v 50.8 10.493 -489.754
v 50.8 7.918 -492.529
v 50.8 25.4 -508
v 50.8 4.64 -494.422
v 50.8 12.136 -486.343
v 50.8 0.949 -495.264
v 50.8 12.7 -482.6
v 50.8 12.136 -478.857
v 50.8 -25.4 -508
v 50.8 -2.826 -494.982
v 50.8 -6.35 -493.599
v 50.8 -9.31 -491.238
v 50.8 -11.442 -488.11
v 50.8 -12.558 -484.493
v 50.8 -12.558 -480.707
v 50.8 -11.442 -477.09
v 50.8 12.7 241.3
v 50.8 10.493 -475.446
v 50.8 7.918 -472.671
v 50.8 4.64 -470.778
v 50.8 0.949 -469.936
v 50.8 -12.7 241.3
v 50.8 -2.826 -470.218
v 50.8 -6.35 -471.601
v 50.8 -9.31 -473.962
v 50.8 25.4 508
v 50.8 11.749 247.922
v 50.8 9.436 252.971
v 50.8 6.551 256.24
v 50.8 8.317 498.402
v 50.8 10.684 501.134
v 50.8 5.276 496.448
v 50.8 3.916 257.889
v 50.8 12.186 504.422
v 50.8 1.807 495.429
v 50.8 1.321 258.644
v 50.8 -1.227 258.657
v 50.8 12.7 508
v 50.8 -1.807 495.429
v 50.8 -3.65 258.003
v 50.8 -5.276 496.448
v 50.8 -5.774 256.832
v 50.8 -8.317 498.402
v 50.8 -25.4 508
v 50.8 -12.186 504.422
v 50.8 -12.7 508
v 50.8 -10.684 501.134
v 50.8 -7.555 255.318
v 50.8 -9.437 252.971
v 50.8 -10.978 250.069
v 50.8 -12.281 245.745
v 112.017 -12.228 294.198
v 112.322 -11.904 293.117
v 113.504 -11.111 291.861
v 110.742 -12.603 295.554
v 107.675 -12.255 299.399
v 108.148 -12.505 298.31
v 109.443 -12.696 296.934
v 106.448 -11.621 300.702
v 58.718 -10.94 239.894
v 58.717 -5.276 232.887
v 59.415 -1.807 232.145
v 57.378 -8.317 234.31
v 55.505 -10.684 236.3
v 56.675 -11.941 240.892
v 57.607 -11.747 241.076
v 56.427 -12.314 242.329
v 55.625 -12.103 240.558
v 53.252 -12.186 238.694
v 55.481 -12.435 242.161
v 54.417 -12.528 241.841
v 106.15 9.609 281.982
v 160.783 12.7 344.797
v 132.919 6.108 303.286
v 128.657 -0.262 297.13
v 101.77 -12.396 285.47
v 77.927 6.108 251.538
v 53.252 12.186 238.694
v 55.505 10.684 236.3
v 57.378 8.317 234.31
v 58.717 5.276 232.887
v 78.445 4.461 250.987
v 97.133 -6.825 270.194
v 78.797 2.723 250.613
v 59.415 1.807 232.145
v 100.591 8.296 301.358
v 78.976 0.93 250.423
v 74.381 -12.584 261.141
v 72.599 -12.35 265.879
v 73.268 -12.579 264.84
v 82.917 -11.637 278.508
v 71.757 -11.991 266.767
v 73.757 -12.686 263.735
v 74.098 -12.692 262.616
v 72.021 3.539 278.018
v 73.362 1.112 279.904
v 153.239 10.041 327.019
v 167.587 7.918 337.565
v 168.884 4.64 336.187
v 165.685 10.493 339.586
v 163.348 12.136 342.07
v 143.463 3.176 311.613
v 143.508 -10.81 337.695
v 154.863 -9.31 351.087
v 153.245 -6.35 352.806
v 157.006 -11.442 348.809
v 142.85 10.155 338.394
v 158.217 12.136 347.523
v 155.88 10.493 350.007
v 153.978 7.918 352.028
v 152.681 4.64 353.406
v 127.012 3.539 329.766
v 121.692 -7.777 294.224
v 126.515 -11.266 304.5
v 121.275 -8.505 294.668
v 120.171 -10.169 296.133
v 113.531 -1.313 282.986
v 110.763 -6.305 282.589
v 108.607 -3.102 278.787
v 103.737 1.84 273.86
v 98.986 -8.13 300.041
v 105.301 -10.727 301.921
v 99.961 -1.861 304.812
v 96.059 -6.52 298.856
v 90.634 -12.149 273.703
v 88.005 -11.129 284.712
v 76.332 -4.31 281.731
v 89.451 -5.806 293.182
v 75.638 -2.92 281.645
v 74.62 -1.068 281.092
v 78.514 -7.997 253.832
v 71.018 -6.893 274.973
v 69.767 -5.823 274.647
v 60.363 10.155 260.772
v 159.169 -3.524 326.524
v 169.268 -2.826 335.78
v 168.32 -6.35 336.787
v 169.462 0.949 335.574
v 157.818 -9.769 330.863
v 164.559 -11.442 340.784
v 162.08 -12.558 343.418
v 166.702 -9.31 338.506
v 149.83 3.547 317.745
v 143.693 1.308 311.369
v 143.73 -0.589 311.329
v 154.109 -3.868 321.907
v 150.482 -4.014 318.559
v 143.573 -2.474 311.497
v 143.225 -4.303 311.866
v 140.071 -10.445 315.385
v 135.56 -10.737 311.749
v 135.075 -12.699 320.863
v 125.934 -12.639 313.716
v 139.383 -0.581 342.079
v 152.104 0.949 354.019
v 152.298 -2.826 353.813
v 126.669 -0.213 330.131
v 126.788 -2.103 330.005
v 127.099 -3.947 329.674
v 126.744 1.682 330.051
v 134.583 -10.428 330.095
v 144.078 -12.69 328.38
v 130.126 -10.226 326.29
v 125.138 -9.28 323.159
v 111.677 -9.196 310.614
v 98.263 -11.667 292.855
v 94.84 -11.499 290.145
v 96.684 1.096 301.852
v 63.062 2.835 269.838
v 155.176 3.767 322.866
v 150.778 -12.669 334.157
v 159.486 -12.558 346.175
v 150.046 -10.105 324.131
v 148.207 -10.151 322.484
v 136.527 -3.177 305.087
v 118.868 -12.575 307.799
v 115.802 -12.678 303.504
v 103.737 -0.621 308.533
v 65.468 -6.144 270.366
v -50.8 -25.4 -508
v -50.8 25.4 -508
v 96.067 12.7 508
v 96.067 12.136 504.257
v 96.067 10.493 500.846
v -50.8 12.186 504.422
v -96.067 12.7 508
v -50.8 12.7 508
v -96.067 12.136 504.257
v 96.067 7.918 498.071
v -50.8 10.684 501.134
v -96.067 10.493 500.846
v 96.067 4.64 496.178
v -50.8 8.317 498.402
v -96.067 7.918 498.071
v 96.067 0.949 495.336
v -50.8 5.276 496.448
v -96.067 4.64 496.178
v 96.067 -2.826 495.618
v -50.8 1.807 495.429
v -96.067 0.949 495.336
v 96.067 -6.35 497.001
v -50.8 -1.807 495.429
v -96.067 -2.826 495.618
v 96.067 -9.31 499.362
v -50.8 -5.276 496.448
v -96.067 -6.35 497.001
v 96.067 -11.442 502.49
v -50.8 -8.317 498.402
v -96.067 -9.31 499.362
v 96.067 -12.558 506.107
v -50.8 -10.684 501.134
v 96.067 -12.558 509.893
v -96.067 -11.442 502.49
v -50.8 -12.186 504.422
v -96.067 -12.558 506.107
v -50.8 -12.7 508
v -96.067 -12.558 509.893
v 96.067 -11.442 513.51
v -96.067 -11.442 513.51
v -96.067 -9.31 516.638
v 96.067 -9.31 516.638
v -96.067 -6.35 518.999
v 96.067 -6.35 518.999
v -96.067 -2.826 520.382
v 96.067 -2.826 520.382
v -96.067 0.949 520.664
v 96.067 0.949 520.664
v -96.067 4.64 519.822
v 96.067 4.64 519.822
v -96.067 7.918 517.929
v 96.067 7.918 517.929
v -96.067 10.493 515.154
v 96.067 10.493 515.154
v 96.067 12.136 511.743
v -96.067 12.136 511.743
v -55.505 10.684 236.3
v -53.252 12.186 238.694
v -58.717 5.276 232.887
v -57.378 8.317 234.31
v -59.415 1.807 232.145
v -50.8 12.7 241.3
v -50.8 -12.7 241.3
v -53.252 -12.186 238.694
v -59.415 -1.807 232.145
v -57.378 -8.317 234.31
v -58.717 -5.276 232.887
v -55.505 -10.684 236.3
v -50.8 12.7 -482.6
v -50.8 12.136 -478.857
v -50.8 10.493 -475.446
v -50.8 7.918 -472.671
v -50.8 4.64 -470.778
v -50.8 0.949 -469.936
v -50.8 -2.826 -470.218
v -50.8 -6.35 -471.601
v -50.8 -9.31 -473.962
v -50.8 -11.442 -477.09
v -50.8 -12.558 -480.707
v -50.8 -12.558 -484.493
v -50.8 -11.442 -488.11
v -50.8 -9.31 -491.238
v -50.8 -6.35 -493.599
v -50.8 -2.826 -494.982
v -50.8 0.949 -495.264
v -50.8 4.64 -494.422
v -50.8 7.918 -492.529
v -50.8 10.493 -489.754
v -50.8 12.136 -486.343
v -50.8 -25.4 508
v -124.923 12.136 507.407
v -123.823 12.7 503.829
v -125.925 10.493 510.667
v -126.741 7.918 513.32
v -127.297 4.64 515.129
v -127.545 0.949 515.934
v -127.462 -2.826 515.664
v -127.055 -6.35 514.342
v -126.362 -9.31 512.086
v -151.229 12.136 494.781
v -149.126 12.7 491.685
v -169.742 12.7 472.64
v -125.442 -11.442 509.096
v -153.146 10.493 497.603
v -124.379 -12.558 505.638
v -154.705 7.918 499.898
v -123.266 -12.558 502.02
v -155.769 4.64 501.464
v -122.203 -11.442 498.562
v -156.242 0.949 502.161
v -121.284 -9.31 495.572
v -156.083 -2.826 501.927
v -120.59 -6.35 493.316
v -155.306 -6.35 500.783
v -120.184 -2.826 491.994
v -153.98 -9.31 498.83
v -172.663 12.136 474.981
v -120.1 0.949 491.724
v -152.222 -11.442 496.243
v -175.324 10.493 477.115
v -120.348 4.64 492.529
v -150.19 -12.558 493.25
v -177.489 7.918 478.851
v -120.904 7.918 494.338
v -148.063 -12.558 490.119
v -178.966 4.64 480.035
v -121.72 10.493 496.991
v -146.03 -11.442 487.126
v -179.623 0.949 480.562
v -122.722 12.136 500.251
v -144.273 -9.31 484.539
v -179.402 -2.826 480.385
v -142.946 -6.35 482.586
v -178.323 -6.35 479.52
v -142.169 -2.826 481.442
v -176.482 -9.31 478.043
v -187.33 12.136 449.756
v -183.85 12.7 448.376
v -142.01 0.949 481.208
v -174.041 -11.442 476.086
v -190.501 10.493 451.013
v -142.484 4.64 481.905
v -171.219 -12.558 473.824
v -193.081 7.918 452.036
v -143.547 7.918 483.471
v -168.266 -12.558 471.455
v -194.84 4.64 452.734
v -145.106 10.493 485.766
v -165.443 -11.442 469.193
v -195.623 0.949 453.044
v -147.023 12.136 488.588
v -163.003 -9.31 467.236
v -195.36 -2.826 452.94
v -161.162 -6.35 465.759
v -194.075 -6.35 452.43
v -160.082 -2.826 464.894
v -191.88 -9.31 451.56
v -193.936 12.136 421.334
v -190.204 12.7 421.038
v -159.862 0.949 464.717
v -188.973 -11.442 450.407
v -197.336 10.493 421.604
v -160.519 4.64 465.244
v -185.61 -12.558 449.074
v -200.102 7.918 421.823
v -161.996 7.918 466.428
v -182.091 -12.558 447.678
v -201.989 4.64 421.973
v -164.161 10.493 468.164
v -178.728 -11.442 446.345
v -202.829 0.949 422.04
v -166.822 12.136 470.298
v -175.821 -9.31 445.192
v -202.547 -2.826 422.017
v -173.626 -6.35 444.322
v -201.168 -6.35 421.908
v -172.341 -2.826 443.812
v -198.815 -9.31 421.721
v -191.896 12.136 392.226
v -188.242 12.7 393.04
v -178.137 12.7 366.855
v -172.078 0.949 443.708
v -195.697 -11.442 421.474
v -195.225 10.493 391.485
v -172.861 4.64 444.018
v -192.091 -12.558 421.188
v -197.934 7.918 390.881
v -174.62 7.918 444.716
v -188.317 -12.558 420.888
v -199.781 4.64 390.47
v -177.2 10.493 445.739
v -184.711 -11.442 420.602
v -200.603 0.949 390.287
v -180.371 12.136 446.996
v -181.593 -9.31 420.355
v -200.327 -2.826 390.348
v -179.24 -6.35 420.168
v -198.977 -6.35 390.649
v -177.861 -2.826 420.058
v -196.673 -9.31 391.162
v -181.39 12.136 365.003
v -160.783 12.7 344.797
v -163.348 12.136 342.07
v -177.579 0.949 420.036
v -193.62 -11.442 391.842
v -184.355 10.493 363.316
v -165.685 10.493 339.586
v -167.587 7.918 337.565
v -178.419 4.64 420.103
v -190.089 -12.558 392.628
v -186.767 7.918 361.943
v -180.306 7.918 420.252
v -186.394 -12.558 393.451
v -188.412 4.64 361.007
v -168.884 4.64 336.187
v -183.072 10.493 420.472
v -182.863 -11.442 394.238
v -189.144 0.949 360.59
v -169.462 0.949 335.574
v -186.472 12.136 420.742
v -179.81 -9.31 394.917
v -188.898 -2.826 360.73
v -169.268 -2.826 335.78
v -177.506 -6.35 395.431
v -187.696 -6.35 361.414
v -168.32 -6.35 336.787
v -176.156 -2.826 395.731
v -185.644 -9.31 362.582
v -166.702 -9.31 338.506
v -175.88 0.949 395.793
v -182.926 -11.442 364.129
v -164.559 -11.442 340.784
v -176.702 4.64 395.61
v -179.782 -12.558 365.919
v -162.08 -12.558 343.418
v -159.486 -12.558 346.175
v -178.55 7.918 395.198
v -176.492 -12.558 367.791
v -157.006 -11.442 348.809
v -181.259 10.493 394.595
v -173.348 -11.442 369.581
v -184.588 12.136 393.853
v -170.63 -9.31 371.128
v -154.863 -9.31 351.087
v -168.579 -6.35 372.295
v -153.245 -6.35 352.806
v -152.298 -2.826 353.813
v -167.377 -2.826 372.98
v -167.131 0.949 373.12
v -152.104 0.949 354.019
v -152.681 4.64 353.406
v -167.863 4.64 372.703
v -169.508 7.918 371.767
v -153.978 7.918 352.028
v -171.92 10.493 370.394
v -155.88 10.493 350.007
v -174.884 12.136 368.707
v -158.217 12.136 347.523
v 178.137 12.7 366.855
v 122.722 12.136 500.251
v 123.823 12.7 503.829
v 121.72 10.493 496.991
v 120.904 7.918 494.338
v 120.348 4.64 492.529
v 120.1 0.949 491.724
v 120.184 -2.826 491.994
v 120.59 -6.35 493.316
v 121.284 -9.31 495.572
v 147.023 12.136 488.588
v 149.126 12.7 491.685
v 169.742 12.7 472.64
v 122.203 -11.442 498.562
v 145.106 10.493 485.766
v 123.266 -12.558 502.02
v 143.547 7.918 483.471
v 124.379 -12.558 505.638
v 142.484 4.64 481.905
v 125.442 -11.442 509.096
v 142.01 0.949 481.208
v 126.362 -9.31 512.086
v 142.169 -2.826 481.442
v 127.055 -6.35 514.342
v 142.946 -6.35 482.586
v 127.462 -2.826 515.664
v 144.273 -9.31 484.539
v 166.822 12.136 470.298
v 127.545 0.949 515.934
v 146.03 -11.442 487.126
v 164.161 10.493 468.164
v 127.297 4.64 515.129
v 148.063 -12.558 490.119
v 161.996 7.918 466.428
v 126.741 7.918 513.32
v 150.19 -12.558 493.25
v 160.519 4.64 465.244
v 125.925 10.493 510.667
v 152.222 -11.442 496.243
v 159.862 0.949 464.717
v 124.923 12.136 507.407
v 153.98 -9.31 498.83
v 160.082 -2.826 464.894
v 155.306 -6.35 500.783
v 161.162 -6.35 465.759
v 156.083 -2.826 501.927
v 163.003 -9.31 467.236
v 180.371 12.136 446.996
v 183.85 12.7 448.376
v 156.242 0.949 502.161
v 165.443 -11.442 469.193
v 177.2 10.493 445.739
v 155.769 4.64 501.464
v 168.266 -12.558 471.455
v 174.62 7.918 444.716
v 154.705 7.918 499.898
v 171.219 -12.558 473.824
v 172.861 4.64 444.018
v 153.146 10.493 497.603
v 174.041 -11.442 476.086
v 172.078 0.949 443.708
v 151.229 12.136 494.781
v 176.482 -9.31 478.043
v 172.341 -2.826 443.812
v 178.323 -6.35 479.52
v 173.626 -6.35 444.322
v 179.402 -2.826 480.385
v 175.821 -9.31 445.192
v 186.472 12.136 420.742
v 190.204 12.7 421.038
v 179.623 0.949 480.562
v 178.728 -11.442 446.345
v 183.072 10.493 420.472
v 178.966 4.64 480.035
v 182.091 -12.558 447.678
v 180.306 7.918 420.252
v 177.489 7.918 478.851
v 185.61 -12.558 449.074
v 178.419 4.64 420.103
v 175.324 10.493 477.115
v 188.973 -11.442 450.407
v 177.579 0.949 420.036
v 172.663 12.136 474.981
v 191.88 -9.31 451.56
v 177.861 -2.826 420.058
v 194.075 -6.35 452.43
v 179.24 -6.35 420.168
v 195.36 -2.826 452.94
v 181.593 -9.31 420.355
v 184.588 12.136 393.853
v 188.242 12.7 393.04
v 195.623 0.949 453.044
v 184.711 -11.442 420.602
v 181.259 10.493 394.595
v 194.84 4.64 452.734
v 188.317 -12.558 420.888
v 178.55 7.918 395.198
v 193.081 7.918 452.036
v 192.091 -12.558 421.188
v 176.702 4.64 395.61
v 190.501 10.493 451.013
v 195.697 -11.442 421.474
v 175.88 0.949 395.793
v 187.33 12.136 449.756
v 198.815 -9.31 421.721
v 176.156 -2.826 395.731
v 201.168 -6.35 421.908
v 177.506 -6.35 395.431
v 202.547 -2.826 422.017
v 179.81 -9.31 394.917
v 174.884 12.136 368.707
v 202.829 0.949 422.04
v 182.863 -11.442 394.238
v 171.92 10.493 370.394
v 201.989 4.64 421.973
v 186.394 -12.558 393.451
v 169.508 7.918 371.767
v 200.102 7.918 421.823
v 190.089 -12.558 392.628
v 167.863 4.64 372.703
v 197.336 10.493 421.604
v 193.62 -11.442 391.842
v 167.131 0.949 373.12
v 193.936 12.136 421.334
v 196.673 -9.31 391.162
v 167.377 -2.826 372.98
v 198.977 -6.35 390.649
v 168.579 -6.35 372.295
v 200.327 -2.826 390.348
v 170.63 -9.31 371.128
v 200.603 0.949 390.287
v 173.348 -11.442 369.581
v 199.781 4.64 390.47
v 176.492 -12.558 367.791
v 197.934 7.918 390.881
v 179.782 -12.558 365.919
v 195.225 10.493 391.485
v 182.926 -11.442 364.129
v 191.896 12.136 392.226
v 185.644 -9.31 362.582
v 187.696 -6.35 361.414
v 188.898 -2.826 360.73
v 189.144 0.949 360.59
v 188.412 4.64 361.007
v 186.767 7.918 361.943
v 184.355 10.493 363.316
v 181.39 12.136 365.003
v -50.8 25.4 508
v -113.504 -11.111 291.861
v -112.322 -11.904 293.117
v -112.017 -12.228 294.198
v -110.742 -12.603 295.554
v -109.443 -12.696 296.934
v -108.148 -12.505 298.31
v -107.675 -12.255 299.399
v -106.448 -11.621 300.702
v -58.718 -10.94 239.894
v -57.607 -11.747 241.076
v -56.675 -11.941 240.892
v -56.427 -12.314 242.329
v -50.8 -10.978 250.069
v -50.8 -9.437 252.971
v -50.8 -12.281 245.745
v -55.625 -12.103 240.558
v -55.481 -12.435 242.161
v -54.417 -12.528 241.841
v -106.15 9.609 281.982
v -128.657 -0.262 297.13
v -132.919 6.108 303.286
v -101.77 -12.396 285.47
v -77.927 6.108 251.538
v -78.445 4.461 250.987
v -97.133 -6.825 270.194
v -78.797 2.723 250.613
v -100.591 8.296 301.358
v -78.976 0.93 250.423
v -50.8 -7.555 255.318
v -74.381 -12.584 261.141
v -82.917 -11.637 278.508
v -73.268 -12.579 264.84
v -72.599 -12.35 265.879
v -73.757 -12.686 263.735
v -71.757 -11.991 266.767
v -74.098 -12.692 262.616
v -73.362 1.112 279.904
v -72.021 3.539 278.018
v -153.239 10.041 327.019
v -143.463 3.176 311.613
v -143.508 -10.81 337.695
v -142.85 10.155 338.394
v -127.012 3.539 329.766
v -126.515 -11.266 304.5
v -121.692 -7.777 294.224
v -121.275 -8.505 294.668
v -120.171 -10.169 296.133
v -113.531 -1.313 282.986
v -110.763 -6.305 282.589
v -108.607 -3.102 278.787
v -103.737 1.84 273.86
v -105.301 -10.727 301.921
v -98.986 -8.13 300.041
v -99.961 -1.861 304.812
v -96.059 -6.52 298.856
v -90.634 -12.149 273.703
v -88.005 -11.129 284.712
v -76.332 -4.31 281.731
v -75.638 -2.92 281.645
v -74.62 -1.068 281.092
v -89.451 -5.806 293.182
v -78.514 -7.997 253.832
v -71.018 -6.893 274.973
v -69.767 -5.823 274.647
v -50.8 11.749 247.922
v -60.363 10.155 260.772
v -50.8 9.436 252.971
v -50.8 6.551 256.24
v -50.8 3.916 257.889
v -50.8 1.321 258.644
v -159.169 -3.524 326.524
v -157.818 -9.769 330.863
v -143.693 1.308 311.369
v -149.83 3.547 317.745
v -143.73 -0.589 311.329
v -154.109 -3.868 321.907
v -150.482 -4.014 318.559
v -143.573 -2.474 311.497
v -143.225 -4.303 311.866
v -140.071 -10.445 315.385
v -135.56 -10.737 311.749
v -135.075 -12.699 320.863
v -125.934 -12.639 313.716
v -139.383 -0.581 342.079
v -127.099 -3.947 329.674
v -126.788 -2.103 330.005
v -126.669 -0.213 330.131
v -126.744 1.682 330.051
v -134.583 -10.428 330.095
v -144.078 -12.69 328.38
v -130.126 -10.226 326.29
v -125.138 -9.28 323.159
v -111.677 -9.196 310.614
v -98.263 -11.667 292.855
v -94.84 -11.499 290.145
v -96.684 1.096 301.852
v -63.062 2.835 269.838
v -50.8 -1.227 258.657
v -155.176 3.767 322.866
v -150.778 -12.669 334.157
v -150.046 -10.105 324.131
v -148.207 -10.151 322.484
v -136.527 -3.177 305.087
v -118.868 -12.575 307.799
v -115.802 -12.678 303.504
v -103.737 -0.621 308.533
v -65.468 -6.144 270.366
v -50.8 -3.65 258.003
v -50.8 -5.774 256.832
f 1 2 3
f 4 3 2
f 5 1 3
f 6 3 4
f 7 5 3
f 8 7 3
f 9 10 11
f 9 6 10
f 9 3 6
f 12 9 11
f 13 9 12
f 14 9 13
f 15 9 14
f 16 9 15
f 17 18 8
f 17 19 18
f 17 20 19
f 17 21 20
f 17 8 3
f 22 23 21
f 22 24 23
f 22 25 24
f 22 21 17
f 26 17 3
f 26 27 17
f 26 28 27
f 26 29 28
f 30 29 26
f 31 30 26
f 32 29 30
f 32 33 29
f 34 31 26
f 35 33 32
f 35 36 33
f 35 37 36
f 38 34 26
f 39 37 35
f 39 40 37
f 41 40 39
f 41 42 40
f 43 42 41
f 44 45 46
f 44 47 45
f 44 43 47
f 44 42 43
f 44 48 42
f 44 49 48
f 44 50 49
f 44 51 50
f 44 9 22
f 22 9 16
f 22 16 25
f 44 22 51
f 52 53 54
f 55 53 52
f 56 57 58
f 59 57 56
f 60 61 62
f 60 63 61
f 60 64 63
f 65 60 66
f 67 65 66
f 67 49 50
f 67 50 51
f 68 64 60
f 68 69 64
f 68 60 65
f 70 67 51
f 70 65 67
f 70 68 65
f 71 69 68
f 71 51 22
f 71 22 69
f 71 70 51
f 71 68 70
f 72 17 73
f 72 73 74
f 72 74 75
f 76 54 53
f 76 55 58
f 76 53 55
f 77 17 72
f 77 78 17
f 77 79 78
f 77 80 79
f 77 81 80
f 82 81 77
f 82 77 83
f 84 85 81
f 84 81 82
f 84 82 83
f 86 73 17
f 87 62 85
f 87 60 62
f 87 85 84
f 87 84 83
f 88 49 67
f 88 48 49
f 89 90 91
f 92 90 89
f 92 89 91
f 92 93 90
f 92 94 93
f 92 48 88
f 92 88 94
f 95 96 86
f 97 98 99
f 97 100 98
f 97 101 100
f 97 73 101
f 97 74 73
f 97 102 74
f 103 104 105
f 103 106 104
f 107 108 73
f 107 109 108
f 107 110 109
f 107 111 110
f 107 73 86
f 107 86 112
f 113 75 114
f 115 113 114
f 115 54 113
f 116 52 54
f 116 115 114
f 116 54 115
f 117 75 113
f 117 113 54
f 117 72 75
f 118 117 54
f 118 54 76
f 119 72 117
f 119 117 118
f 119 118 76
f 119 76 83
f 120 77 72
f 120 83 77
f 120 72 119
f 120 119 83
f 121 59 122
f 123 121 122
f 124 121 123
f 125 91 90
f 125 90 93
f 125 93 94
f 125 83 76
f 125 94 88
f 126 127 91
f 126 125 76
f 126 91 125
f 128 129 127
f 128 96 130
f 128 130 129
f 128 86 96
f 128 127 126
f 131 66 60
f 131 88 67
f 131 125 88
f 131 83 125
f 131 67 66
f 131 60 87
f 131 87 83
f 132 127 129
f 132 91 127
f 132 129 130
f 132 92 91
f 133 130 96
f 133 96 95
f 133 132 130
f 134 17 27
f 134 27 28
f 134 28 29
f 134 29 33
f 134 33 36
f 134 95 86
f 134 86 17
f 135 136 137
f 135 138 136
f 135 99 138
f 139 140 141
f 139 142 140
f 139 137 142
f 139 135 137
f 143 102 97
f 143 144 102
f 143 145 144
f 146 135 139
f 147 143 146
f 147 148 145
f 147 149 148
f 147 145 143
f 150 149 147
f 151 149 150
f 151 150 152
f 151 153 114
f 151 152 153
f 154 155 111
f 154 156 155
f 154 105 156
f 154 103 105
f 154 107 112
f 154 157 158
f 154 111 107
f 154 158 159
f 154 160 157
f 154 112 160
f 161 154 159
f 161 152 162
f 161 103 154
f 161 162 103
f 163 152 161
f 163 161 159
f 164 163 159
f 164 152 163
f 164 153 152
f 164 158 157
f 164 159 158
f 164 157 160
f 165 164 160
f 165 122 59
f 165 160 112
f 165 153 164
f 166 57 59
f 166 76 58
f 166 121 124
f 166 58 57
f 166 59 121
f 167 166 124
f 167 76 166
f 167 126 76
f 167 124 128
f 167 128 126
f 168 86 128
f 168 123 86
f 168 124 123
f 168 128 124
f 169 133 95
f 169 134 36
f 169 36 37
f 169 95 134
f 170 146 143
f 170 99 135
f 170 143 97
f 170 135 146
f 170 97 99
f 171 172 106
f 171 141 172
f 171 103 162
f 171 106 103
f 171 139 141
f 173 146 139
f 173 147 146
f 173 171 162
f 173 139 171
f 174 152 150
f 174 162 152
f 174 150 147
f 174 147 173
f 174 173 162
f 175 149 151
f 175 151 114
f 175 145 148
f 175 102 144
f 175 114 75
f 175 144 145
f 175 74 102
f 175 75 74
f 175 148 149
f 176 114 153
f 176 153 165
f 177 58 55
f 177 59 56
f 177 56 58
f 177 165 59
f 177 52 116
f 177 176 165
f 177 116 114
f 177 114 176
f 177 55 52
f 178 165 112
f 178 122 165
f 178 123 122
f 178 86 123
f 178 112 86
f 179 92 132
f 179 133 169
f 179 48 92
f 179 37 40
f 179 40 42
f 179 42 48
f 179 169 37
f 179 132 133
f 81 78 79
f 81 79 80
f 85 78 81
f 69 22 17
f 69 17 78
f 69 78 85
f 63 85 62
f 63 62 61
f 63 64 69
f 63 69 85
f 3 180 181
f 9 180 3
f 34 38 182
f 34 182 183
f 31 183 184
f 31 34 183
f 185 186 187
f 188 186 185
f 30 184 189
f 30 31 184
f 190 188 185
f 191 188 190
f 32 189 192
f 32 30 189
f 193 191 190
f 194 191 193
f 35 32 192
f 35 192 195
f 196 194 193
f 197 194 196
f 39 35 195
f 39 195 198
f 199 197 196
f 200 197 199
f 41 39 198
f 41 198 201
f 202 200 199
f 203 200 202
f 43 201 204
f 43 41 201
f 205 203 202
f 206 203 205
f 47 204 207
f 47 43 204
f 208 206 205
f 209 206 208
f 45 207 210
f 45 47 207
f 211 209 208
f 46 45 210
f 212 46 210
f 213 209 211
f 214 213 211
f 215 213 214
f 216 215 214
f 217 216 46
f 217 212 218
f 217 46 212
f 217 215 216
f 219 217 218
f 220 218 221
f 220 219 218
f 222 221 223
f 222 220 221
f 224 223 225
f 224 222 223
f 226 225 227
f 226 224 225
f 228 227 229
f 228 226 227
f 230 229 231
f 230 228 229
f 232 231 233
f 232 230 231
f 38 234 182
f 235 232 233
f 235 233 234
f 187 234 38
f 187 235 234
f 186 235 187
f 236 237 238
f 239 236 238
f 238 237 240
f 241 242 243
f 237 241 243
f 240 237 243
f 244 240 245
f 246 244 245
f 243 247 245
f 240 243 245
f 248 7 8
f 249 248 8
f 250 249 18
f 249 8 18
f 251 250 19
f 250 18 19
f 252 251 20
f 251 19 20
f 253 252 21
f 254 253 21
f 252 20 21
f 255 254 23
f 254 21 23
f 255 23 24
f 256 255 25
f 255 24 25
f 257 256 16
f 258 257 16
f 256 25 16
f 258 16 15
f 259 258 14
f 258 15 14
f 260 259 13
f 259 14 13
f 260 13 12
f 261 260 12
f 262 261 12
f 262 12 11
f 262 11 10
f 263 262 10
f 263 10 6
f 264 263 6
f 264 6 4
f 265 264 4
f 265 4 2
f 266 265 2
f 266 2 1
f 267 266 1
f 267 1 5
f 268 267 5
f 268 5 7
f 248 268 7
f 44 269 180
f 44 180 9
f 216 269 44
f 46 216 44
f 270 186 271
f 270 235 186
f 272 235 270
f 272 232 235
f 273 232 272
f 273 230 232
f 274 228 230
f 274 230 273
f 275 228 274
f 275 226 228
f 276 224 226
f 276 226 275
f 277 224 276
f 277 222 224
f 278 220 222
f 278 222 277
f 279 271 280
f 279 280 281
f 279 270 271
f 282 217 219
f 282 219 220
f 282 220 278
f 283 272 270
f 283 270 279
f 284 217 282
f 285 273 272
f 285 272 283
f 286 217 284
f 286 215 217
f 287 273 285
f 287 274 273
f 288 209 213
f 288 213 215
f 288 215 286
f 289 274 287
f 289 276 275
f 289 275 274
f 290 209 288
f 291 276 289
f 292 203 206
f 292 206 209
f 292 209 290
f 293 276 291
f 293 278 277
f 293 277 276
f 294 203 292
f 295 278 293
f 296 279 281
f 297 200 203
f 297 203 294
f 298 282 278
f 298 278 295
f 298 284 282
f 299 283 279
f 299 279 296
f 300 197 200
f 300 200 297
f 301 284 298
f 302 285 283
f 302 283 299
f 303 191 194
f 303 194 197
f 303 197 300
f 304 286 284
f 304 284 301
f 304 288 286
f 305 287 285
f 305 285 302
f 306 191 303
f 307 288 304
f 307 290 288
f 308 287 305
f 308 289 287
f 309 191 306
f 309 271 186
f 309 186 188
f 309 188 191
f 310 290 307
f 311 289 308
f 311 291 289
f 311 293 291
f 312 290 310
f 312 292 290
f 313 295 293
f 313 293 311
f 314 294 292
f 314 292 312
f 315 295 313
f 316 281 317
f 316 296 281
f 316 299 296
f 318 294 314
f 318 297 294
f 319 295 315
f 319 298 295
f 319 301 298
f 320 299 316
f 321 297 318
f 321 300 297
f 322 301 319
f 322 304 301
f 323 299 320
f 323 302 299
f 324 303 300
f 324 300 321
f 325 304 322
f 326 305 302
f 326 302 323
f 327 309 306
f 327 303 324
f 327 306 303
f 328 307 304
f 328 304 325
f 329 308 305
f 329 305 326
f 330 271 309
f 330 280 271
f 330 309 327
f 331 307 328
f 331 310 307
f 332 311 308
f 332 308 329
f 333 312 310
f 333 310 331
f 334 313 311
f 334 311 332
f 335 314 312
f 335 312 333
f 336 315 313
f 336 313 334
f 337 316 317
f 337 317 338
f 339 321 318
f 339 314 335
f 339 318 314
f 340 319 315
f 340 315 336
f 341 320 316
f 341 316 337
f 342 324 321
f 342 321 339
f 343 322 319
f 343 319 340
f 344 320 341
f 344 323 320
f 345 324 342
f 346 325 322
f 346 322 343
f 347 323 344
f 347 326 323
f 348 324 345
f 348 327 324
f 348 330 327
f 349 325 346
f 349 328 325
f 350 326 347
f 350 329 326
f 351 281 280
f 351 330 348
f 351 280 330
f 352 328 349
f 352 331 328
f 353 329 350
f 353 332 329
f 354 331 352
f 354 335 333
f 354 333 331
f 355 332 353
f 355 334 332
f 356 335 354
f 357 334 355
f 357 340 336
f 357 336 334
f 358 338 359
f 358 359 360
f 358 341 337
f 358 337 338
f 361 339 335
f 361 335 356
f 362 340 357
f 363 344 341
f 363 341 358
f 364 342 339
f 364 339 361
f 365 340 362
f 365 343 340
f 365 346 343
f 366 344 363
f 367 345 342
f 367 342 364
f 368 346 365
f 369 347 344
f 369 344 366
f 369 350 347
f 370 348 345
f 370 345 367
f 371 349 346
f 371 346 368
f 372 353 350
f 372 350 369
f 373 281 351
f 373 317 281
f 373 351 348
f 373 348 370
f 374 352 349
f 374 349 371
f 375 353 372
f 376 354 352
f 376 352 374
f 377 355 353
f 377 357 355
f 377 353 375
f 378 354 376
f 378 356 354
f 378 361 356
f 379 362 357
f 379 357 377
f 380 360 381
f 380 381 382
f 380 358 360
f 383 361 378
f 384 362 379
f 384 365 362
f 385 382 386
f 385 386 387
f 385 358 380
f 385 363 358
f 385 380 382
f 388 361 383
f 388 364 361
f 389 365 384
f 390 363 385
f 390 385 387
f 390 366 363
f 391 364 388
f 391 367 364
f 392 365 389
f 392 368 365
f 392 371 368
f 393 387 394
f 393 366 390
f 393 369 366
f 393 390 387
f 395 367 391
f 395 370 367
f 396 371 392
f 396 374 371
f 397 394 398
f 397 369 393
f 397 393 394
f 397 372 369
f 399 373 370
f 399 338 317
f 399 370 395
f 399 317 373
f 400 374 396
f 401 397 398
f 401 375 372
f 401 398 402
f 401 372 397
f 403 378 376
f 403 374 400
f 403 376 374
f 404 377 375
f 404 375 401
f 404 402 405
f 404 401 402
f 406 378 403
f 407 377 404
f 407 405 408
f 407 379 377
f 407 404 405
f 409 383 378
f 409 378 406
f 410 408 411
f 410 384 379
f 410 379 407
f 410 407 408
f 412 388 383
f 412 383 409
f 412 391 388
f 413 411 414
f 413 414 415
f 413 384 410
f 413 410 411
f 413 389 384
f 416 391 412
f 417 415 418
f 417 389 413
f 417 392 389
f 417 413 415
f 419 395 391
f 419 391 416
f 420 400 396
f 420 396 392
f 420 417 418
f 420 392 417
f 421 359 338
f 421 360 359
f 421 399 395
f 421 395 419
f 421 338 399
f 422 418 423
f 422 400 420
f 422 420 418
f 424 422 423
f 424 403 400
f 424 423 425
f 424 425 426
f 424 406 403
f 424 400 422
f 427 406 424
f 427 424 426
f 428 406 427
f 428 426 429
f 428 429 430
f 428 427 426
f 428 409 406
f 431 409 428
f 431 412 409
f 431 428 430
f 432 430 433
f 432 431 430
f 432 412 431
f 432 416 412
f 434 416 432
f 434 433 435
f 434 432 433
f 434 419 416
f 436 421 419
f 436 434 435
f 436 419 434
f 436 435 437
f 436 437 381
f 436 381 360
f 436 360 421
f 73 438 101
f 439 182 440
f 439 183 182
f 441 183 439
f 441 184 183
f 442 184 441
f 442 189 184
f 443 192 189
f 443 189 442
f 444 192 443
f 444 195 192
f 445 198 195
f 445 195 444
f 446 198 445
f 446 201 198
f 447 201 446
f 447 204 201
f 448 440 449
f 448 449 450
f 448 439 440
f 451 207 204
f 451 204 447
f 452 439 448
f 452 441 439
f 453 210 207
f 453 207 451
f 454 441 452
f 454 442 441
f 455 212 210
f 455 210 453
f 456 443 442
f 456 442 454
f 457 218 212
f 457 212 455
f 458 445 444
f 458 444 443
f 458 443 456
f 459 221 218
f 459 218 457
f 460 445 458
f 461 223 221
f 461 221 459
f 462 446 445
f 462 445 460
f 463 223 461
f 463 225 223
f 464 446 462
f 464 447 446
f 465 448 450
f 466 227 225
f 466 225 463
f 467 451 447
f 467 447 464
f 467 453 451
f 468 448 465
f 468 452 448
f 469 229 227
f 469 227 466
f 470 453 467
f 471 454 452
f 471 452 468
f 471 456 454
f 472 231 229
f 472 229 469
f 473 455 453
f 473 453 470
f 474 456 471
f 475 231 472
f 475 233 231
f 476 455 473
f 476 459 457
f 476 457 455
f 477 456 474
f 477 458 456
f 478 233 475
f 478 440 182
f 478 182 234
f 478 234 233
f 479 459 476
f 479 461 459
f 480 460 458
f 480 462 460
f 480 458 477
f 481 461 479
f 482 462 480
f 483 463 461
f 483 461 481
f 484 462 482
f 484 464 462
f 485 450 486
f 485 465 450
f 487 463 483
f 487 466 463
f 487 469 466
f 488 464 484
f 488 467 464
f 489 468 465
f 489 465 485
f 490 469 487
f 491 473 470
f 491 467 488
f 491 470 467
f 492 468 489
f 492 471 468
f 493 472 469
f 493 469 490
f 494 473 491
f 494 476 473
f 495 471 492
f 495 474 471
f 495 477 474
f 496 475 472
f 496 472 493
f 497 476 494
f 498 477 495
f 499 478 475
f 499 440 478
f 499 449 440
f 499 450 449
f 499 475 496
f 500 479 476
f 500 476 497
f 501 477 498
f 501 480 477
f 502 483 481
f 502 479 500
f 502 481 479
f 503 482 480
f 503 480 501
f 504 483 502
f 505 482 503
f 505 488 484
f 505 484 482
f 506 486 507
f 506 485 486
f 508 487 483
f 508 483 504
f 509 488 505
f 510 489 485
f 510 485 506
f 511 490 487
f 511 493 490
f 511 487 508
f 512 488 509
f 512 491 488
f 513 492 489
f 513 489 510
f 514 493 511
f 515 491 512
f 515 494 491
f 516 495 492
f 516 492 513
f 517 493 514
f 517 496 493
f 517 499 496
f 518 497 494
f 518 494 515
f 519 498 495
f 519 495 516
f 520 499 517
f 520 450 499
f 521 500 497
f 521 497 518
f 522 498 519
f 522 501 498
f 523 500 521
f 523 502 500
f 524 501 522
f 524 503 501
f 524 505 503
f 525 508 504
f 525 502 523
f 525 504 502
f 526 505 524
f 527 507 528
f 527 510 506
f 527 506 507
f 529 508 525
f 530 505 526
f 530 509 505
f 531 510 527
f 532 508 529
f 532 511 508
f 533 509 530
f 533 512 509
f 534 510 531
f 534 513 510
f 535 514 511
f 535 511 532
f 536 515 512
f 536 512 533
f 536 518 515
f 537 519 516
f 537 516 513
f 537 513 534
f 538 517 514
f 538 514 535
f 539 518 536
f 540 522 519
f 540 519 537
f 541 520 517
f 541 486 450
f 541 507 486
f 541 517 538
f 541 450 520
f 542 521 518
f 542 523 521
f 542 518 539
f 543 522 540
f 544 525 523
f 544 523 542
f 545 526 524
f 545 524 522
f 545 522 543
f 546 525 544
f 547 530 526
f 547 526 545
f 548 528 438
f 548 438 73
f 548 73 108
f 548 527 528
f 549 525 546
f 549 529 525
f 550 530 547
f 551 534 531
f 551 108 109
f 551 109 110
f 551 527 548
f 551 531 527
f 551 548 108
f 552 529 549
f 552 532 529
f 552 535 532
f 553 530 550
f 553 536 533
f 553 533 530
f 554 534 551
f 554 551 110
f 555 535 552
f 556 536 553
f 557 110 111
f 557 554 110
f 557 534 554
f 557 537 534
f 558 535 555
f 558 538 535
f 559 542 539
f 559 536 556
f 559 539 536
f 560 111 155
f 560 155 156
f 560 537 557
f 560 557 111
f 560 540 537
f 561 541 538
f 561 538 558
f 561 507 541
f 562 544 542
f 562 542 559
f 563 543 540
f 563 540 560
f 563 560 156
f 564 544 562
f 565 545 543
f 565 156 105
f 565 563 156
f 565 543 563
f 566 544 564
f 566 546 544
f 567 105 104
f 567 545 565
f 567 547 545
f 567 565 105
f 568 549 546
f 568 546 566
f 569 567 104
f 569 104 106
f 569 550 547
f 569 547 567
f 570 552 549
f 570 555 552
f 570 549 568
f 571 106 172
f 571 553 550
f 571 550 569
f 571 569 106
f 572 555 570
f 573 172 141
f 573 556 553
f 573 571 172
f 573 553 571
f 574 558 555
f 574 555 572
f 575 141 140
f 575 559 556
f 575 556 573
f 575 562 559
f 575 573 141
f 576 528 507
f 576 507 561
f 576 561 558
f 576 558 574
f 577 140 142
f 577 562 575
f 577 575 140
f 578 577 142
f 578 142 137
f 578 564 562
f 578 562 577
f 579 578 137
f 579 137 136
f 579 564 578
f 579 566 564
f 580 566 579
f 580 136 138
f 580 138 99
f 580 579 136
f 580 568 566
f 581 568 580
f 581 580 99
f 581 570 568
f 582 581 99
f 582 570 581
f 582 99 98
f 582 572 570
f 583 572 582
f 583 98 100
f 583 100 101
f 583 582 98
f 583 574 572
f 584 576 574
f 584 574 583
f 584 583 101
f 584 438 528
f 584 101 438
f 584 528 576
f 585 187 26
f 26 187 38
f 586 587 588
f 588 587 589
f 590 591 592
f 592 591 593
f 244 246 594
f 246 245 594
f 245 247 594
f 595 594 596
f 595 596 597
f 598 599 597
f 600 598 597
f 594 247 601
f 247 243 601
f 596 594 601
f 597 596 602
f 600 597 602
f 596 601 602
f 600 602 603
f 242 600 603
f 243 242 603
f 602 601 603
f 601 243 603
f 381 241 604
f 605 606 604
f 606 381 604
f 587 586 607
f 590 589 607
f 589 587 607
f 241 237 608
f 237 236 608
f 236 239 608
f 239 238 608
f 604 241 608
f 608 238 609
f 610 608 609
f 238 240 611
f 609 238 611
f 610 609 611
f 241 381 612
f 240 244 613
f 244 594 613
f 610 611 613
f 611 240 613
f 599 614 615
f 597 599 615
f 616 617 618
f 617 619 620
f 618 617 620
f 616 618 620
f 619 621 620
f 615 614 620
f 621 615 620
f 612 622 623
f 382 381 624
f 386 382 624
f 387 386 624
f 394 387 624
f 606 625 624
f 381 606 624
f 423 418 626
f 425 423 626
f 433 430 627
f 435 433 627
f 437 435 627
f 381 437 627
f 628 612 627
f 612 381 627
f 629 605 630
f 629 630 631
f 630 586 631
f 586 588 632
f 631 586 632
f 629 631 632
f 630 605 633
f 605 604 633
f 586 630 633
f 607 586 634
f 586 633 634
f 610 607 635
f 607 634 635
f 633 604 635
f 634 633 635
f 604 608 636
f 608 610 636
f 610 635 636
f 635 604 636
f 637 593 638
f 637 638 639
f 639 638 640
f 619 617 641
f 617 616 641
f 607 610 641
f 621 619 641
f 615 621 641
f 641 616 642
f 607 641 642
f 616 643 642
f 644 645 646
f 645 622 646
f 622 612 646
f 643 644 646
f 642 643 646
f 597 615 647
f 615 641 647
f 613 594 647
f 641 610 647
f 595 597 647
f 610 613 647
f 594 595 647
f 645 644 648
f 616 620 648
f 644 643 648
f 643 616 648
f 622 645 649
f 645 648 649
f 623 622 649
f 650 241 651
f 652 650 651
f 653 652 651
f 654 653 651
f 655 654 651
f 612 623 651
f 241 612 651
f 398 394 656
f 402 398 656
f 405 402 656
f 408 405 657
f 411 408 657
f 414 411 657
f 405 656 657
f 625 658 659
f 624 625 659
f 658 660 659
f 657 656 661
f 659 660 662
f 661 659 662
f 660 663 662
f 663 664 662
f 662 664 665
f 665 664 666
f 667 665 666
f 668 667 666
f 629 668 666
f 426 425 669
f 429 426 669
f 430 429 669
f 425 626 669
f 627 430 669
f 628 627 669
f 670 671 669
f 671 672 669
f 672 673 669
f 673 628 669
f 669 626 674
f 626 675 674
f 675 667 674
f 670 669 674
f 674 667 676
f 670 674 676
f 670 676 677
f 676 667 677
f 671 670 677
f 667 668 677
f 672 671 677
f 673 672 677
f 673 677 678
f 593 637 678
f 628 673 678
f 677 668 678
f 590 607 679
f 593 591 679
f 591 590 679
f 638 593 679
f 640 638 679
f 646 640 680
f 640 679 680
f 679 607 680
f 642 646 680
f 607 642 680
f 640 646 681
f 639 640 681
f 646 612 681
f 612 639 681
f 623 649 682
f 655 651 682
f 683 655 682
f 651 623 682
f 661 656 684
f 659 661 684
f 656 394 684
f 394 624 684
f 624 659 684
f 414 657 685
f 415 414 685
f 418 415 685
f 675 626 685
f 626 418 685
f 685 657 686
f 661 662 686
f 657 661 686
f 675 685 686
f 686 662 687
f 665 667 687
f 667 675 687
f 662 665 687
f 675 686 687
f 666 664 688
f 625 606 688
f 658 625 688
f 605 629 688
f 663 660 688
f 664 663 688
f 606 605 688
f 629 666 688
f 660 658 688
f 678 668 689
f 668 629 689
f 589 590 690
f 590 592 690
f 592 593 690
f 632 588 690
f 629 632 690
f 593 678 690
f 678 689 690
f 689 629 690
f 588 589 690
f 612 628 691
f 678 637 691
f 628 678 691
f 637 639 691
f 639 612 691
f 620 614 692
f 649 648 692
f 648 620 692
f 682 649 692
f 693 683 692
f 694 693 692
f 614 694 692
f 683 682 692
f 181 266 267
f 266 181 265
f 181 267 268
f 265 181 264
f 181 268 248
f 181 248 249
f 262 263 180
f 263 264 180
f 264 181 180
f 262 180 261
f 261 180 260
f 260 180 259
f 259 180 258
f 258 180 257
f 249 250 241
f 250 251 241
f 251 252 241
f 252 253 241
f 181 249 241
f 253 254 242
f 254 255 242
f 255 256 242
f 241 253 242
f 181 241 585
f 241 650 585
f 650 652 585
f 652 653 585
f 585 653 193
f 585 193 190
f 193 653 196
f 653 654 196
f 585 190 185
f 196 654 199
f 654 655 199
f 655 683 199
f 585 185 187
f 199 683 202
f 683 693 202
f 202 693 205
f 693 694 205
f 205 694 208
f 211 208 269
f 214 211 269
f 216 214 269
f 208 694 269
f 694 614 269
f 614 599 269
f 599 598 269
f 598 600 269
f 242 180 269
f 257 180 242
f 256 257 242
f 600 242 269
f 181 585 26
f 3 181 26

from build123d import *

# Parameters (mm, degrees)
F0_W     = 101.6
F0_H     = 1016
F1_DEPTH = 25.4
F3_R     = 12.7
F6_R     = 12.7
F7_DEPTH = 254.001


with BuildPart() as f1:
    # F0 (on Front) → F1 (new body, symmetric)
    with BuildSketch(Plane.XZ):
        Rectangle(F0_W, F0_H)
    extrude(amount=F1_DEPTH, both=True)

    # F4: sweep along a path in F2
    with BuildLine(Plane.XZ) as f4_path:
        Line((0, 508), (96.067466, 508))
        ThreePointArc((96.067466, 508), (183.85049, 448.376145), (160.782686, 344.796515))
        Line((160.782686, 344.796515), (50.8, 241.3))
    # F3 (on Right) → F4 (sweep)
    with BuildSketch(Plane.YZ):
        with Locations((0, 508)):
            Circle(F3_R)
    sweep(path=f4_path.line)

    # F5: sweep along a path in F2
    with BuildLine(Plane.XZ) as f5_path:
        Line((0, 508), (-96.067466, 508))
        ThreePointArc((-96.067466, 508), (-183.85049, 448.376145), (-160.782686, 344.796515))
        Line((-160.782686, 344.796515), (-50.8, 241.3))
    # F3 (on Right) → F5 (sweep)
    with BuildSketch(Plane.YZ):
        with Locations((0, 508)):
            Circle(F3_R)
    sweep(path=f5_path.line)

    # F6 (on face) → F7 (cut, through all)
    with BuildSketch(Plane.YZ.offset(50.8)):
        with Locations((0, -482.6)):
            Circle(F6_R)
    extrude(amount=-F7_DEPTH, mode=Mode.SUBTRACT)


solid = f1.part
